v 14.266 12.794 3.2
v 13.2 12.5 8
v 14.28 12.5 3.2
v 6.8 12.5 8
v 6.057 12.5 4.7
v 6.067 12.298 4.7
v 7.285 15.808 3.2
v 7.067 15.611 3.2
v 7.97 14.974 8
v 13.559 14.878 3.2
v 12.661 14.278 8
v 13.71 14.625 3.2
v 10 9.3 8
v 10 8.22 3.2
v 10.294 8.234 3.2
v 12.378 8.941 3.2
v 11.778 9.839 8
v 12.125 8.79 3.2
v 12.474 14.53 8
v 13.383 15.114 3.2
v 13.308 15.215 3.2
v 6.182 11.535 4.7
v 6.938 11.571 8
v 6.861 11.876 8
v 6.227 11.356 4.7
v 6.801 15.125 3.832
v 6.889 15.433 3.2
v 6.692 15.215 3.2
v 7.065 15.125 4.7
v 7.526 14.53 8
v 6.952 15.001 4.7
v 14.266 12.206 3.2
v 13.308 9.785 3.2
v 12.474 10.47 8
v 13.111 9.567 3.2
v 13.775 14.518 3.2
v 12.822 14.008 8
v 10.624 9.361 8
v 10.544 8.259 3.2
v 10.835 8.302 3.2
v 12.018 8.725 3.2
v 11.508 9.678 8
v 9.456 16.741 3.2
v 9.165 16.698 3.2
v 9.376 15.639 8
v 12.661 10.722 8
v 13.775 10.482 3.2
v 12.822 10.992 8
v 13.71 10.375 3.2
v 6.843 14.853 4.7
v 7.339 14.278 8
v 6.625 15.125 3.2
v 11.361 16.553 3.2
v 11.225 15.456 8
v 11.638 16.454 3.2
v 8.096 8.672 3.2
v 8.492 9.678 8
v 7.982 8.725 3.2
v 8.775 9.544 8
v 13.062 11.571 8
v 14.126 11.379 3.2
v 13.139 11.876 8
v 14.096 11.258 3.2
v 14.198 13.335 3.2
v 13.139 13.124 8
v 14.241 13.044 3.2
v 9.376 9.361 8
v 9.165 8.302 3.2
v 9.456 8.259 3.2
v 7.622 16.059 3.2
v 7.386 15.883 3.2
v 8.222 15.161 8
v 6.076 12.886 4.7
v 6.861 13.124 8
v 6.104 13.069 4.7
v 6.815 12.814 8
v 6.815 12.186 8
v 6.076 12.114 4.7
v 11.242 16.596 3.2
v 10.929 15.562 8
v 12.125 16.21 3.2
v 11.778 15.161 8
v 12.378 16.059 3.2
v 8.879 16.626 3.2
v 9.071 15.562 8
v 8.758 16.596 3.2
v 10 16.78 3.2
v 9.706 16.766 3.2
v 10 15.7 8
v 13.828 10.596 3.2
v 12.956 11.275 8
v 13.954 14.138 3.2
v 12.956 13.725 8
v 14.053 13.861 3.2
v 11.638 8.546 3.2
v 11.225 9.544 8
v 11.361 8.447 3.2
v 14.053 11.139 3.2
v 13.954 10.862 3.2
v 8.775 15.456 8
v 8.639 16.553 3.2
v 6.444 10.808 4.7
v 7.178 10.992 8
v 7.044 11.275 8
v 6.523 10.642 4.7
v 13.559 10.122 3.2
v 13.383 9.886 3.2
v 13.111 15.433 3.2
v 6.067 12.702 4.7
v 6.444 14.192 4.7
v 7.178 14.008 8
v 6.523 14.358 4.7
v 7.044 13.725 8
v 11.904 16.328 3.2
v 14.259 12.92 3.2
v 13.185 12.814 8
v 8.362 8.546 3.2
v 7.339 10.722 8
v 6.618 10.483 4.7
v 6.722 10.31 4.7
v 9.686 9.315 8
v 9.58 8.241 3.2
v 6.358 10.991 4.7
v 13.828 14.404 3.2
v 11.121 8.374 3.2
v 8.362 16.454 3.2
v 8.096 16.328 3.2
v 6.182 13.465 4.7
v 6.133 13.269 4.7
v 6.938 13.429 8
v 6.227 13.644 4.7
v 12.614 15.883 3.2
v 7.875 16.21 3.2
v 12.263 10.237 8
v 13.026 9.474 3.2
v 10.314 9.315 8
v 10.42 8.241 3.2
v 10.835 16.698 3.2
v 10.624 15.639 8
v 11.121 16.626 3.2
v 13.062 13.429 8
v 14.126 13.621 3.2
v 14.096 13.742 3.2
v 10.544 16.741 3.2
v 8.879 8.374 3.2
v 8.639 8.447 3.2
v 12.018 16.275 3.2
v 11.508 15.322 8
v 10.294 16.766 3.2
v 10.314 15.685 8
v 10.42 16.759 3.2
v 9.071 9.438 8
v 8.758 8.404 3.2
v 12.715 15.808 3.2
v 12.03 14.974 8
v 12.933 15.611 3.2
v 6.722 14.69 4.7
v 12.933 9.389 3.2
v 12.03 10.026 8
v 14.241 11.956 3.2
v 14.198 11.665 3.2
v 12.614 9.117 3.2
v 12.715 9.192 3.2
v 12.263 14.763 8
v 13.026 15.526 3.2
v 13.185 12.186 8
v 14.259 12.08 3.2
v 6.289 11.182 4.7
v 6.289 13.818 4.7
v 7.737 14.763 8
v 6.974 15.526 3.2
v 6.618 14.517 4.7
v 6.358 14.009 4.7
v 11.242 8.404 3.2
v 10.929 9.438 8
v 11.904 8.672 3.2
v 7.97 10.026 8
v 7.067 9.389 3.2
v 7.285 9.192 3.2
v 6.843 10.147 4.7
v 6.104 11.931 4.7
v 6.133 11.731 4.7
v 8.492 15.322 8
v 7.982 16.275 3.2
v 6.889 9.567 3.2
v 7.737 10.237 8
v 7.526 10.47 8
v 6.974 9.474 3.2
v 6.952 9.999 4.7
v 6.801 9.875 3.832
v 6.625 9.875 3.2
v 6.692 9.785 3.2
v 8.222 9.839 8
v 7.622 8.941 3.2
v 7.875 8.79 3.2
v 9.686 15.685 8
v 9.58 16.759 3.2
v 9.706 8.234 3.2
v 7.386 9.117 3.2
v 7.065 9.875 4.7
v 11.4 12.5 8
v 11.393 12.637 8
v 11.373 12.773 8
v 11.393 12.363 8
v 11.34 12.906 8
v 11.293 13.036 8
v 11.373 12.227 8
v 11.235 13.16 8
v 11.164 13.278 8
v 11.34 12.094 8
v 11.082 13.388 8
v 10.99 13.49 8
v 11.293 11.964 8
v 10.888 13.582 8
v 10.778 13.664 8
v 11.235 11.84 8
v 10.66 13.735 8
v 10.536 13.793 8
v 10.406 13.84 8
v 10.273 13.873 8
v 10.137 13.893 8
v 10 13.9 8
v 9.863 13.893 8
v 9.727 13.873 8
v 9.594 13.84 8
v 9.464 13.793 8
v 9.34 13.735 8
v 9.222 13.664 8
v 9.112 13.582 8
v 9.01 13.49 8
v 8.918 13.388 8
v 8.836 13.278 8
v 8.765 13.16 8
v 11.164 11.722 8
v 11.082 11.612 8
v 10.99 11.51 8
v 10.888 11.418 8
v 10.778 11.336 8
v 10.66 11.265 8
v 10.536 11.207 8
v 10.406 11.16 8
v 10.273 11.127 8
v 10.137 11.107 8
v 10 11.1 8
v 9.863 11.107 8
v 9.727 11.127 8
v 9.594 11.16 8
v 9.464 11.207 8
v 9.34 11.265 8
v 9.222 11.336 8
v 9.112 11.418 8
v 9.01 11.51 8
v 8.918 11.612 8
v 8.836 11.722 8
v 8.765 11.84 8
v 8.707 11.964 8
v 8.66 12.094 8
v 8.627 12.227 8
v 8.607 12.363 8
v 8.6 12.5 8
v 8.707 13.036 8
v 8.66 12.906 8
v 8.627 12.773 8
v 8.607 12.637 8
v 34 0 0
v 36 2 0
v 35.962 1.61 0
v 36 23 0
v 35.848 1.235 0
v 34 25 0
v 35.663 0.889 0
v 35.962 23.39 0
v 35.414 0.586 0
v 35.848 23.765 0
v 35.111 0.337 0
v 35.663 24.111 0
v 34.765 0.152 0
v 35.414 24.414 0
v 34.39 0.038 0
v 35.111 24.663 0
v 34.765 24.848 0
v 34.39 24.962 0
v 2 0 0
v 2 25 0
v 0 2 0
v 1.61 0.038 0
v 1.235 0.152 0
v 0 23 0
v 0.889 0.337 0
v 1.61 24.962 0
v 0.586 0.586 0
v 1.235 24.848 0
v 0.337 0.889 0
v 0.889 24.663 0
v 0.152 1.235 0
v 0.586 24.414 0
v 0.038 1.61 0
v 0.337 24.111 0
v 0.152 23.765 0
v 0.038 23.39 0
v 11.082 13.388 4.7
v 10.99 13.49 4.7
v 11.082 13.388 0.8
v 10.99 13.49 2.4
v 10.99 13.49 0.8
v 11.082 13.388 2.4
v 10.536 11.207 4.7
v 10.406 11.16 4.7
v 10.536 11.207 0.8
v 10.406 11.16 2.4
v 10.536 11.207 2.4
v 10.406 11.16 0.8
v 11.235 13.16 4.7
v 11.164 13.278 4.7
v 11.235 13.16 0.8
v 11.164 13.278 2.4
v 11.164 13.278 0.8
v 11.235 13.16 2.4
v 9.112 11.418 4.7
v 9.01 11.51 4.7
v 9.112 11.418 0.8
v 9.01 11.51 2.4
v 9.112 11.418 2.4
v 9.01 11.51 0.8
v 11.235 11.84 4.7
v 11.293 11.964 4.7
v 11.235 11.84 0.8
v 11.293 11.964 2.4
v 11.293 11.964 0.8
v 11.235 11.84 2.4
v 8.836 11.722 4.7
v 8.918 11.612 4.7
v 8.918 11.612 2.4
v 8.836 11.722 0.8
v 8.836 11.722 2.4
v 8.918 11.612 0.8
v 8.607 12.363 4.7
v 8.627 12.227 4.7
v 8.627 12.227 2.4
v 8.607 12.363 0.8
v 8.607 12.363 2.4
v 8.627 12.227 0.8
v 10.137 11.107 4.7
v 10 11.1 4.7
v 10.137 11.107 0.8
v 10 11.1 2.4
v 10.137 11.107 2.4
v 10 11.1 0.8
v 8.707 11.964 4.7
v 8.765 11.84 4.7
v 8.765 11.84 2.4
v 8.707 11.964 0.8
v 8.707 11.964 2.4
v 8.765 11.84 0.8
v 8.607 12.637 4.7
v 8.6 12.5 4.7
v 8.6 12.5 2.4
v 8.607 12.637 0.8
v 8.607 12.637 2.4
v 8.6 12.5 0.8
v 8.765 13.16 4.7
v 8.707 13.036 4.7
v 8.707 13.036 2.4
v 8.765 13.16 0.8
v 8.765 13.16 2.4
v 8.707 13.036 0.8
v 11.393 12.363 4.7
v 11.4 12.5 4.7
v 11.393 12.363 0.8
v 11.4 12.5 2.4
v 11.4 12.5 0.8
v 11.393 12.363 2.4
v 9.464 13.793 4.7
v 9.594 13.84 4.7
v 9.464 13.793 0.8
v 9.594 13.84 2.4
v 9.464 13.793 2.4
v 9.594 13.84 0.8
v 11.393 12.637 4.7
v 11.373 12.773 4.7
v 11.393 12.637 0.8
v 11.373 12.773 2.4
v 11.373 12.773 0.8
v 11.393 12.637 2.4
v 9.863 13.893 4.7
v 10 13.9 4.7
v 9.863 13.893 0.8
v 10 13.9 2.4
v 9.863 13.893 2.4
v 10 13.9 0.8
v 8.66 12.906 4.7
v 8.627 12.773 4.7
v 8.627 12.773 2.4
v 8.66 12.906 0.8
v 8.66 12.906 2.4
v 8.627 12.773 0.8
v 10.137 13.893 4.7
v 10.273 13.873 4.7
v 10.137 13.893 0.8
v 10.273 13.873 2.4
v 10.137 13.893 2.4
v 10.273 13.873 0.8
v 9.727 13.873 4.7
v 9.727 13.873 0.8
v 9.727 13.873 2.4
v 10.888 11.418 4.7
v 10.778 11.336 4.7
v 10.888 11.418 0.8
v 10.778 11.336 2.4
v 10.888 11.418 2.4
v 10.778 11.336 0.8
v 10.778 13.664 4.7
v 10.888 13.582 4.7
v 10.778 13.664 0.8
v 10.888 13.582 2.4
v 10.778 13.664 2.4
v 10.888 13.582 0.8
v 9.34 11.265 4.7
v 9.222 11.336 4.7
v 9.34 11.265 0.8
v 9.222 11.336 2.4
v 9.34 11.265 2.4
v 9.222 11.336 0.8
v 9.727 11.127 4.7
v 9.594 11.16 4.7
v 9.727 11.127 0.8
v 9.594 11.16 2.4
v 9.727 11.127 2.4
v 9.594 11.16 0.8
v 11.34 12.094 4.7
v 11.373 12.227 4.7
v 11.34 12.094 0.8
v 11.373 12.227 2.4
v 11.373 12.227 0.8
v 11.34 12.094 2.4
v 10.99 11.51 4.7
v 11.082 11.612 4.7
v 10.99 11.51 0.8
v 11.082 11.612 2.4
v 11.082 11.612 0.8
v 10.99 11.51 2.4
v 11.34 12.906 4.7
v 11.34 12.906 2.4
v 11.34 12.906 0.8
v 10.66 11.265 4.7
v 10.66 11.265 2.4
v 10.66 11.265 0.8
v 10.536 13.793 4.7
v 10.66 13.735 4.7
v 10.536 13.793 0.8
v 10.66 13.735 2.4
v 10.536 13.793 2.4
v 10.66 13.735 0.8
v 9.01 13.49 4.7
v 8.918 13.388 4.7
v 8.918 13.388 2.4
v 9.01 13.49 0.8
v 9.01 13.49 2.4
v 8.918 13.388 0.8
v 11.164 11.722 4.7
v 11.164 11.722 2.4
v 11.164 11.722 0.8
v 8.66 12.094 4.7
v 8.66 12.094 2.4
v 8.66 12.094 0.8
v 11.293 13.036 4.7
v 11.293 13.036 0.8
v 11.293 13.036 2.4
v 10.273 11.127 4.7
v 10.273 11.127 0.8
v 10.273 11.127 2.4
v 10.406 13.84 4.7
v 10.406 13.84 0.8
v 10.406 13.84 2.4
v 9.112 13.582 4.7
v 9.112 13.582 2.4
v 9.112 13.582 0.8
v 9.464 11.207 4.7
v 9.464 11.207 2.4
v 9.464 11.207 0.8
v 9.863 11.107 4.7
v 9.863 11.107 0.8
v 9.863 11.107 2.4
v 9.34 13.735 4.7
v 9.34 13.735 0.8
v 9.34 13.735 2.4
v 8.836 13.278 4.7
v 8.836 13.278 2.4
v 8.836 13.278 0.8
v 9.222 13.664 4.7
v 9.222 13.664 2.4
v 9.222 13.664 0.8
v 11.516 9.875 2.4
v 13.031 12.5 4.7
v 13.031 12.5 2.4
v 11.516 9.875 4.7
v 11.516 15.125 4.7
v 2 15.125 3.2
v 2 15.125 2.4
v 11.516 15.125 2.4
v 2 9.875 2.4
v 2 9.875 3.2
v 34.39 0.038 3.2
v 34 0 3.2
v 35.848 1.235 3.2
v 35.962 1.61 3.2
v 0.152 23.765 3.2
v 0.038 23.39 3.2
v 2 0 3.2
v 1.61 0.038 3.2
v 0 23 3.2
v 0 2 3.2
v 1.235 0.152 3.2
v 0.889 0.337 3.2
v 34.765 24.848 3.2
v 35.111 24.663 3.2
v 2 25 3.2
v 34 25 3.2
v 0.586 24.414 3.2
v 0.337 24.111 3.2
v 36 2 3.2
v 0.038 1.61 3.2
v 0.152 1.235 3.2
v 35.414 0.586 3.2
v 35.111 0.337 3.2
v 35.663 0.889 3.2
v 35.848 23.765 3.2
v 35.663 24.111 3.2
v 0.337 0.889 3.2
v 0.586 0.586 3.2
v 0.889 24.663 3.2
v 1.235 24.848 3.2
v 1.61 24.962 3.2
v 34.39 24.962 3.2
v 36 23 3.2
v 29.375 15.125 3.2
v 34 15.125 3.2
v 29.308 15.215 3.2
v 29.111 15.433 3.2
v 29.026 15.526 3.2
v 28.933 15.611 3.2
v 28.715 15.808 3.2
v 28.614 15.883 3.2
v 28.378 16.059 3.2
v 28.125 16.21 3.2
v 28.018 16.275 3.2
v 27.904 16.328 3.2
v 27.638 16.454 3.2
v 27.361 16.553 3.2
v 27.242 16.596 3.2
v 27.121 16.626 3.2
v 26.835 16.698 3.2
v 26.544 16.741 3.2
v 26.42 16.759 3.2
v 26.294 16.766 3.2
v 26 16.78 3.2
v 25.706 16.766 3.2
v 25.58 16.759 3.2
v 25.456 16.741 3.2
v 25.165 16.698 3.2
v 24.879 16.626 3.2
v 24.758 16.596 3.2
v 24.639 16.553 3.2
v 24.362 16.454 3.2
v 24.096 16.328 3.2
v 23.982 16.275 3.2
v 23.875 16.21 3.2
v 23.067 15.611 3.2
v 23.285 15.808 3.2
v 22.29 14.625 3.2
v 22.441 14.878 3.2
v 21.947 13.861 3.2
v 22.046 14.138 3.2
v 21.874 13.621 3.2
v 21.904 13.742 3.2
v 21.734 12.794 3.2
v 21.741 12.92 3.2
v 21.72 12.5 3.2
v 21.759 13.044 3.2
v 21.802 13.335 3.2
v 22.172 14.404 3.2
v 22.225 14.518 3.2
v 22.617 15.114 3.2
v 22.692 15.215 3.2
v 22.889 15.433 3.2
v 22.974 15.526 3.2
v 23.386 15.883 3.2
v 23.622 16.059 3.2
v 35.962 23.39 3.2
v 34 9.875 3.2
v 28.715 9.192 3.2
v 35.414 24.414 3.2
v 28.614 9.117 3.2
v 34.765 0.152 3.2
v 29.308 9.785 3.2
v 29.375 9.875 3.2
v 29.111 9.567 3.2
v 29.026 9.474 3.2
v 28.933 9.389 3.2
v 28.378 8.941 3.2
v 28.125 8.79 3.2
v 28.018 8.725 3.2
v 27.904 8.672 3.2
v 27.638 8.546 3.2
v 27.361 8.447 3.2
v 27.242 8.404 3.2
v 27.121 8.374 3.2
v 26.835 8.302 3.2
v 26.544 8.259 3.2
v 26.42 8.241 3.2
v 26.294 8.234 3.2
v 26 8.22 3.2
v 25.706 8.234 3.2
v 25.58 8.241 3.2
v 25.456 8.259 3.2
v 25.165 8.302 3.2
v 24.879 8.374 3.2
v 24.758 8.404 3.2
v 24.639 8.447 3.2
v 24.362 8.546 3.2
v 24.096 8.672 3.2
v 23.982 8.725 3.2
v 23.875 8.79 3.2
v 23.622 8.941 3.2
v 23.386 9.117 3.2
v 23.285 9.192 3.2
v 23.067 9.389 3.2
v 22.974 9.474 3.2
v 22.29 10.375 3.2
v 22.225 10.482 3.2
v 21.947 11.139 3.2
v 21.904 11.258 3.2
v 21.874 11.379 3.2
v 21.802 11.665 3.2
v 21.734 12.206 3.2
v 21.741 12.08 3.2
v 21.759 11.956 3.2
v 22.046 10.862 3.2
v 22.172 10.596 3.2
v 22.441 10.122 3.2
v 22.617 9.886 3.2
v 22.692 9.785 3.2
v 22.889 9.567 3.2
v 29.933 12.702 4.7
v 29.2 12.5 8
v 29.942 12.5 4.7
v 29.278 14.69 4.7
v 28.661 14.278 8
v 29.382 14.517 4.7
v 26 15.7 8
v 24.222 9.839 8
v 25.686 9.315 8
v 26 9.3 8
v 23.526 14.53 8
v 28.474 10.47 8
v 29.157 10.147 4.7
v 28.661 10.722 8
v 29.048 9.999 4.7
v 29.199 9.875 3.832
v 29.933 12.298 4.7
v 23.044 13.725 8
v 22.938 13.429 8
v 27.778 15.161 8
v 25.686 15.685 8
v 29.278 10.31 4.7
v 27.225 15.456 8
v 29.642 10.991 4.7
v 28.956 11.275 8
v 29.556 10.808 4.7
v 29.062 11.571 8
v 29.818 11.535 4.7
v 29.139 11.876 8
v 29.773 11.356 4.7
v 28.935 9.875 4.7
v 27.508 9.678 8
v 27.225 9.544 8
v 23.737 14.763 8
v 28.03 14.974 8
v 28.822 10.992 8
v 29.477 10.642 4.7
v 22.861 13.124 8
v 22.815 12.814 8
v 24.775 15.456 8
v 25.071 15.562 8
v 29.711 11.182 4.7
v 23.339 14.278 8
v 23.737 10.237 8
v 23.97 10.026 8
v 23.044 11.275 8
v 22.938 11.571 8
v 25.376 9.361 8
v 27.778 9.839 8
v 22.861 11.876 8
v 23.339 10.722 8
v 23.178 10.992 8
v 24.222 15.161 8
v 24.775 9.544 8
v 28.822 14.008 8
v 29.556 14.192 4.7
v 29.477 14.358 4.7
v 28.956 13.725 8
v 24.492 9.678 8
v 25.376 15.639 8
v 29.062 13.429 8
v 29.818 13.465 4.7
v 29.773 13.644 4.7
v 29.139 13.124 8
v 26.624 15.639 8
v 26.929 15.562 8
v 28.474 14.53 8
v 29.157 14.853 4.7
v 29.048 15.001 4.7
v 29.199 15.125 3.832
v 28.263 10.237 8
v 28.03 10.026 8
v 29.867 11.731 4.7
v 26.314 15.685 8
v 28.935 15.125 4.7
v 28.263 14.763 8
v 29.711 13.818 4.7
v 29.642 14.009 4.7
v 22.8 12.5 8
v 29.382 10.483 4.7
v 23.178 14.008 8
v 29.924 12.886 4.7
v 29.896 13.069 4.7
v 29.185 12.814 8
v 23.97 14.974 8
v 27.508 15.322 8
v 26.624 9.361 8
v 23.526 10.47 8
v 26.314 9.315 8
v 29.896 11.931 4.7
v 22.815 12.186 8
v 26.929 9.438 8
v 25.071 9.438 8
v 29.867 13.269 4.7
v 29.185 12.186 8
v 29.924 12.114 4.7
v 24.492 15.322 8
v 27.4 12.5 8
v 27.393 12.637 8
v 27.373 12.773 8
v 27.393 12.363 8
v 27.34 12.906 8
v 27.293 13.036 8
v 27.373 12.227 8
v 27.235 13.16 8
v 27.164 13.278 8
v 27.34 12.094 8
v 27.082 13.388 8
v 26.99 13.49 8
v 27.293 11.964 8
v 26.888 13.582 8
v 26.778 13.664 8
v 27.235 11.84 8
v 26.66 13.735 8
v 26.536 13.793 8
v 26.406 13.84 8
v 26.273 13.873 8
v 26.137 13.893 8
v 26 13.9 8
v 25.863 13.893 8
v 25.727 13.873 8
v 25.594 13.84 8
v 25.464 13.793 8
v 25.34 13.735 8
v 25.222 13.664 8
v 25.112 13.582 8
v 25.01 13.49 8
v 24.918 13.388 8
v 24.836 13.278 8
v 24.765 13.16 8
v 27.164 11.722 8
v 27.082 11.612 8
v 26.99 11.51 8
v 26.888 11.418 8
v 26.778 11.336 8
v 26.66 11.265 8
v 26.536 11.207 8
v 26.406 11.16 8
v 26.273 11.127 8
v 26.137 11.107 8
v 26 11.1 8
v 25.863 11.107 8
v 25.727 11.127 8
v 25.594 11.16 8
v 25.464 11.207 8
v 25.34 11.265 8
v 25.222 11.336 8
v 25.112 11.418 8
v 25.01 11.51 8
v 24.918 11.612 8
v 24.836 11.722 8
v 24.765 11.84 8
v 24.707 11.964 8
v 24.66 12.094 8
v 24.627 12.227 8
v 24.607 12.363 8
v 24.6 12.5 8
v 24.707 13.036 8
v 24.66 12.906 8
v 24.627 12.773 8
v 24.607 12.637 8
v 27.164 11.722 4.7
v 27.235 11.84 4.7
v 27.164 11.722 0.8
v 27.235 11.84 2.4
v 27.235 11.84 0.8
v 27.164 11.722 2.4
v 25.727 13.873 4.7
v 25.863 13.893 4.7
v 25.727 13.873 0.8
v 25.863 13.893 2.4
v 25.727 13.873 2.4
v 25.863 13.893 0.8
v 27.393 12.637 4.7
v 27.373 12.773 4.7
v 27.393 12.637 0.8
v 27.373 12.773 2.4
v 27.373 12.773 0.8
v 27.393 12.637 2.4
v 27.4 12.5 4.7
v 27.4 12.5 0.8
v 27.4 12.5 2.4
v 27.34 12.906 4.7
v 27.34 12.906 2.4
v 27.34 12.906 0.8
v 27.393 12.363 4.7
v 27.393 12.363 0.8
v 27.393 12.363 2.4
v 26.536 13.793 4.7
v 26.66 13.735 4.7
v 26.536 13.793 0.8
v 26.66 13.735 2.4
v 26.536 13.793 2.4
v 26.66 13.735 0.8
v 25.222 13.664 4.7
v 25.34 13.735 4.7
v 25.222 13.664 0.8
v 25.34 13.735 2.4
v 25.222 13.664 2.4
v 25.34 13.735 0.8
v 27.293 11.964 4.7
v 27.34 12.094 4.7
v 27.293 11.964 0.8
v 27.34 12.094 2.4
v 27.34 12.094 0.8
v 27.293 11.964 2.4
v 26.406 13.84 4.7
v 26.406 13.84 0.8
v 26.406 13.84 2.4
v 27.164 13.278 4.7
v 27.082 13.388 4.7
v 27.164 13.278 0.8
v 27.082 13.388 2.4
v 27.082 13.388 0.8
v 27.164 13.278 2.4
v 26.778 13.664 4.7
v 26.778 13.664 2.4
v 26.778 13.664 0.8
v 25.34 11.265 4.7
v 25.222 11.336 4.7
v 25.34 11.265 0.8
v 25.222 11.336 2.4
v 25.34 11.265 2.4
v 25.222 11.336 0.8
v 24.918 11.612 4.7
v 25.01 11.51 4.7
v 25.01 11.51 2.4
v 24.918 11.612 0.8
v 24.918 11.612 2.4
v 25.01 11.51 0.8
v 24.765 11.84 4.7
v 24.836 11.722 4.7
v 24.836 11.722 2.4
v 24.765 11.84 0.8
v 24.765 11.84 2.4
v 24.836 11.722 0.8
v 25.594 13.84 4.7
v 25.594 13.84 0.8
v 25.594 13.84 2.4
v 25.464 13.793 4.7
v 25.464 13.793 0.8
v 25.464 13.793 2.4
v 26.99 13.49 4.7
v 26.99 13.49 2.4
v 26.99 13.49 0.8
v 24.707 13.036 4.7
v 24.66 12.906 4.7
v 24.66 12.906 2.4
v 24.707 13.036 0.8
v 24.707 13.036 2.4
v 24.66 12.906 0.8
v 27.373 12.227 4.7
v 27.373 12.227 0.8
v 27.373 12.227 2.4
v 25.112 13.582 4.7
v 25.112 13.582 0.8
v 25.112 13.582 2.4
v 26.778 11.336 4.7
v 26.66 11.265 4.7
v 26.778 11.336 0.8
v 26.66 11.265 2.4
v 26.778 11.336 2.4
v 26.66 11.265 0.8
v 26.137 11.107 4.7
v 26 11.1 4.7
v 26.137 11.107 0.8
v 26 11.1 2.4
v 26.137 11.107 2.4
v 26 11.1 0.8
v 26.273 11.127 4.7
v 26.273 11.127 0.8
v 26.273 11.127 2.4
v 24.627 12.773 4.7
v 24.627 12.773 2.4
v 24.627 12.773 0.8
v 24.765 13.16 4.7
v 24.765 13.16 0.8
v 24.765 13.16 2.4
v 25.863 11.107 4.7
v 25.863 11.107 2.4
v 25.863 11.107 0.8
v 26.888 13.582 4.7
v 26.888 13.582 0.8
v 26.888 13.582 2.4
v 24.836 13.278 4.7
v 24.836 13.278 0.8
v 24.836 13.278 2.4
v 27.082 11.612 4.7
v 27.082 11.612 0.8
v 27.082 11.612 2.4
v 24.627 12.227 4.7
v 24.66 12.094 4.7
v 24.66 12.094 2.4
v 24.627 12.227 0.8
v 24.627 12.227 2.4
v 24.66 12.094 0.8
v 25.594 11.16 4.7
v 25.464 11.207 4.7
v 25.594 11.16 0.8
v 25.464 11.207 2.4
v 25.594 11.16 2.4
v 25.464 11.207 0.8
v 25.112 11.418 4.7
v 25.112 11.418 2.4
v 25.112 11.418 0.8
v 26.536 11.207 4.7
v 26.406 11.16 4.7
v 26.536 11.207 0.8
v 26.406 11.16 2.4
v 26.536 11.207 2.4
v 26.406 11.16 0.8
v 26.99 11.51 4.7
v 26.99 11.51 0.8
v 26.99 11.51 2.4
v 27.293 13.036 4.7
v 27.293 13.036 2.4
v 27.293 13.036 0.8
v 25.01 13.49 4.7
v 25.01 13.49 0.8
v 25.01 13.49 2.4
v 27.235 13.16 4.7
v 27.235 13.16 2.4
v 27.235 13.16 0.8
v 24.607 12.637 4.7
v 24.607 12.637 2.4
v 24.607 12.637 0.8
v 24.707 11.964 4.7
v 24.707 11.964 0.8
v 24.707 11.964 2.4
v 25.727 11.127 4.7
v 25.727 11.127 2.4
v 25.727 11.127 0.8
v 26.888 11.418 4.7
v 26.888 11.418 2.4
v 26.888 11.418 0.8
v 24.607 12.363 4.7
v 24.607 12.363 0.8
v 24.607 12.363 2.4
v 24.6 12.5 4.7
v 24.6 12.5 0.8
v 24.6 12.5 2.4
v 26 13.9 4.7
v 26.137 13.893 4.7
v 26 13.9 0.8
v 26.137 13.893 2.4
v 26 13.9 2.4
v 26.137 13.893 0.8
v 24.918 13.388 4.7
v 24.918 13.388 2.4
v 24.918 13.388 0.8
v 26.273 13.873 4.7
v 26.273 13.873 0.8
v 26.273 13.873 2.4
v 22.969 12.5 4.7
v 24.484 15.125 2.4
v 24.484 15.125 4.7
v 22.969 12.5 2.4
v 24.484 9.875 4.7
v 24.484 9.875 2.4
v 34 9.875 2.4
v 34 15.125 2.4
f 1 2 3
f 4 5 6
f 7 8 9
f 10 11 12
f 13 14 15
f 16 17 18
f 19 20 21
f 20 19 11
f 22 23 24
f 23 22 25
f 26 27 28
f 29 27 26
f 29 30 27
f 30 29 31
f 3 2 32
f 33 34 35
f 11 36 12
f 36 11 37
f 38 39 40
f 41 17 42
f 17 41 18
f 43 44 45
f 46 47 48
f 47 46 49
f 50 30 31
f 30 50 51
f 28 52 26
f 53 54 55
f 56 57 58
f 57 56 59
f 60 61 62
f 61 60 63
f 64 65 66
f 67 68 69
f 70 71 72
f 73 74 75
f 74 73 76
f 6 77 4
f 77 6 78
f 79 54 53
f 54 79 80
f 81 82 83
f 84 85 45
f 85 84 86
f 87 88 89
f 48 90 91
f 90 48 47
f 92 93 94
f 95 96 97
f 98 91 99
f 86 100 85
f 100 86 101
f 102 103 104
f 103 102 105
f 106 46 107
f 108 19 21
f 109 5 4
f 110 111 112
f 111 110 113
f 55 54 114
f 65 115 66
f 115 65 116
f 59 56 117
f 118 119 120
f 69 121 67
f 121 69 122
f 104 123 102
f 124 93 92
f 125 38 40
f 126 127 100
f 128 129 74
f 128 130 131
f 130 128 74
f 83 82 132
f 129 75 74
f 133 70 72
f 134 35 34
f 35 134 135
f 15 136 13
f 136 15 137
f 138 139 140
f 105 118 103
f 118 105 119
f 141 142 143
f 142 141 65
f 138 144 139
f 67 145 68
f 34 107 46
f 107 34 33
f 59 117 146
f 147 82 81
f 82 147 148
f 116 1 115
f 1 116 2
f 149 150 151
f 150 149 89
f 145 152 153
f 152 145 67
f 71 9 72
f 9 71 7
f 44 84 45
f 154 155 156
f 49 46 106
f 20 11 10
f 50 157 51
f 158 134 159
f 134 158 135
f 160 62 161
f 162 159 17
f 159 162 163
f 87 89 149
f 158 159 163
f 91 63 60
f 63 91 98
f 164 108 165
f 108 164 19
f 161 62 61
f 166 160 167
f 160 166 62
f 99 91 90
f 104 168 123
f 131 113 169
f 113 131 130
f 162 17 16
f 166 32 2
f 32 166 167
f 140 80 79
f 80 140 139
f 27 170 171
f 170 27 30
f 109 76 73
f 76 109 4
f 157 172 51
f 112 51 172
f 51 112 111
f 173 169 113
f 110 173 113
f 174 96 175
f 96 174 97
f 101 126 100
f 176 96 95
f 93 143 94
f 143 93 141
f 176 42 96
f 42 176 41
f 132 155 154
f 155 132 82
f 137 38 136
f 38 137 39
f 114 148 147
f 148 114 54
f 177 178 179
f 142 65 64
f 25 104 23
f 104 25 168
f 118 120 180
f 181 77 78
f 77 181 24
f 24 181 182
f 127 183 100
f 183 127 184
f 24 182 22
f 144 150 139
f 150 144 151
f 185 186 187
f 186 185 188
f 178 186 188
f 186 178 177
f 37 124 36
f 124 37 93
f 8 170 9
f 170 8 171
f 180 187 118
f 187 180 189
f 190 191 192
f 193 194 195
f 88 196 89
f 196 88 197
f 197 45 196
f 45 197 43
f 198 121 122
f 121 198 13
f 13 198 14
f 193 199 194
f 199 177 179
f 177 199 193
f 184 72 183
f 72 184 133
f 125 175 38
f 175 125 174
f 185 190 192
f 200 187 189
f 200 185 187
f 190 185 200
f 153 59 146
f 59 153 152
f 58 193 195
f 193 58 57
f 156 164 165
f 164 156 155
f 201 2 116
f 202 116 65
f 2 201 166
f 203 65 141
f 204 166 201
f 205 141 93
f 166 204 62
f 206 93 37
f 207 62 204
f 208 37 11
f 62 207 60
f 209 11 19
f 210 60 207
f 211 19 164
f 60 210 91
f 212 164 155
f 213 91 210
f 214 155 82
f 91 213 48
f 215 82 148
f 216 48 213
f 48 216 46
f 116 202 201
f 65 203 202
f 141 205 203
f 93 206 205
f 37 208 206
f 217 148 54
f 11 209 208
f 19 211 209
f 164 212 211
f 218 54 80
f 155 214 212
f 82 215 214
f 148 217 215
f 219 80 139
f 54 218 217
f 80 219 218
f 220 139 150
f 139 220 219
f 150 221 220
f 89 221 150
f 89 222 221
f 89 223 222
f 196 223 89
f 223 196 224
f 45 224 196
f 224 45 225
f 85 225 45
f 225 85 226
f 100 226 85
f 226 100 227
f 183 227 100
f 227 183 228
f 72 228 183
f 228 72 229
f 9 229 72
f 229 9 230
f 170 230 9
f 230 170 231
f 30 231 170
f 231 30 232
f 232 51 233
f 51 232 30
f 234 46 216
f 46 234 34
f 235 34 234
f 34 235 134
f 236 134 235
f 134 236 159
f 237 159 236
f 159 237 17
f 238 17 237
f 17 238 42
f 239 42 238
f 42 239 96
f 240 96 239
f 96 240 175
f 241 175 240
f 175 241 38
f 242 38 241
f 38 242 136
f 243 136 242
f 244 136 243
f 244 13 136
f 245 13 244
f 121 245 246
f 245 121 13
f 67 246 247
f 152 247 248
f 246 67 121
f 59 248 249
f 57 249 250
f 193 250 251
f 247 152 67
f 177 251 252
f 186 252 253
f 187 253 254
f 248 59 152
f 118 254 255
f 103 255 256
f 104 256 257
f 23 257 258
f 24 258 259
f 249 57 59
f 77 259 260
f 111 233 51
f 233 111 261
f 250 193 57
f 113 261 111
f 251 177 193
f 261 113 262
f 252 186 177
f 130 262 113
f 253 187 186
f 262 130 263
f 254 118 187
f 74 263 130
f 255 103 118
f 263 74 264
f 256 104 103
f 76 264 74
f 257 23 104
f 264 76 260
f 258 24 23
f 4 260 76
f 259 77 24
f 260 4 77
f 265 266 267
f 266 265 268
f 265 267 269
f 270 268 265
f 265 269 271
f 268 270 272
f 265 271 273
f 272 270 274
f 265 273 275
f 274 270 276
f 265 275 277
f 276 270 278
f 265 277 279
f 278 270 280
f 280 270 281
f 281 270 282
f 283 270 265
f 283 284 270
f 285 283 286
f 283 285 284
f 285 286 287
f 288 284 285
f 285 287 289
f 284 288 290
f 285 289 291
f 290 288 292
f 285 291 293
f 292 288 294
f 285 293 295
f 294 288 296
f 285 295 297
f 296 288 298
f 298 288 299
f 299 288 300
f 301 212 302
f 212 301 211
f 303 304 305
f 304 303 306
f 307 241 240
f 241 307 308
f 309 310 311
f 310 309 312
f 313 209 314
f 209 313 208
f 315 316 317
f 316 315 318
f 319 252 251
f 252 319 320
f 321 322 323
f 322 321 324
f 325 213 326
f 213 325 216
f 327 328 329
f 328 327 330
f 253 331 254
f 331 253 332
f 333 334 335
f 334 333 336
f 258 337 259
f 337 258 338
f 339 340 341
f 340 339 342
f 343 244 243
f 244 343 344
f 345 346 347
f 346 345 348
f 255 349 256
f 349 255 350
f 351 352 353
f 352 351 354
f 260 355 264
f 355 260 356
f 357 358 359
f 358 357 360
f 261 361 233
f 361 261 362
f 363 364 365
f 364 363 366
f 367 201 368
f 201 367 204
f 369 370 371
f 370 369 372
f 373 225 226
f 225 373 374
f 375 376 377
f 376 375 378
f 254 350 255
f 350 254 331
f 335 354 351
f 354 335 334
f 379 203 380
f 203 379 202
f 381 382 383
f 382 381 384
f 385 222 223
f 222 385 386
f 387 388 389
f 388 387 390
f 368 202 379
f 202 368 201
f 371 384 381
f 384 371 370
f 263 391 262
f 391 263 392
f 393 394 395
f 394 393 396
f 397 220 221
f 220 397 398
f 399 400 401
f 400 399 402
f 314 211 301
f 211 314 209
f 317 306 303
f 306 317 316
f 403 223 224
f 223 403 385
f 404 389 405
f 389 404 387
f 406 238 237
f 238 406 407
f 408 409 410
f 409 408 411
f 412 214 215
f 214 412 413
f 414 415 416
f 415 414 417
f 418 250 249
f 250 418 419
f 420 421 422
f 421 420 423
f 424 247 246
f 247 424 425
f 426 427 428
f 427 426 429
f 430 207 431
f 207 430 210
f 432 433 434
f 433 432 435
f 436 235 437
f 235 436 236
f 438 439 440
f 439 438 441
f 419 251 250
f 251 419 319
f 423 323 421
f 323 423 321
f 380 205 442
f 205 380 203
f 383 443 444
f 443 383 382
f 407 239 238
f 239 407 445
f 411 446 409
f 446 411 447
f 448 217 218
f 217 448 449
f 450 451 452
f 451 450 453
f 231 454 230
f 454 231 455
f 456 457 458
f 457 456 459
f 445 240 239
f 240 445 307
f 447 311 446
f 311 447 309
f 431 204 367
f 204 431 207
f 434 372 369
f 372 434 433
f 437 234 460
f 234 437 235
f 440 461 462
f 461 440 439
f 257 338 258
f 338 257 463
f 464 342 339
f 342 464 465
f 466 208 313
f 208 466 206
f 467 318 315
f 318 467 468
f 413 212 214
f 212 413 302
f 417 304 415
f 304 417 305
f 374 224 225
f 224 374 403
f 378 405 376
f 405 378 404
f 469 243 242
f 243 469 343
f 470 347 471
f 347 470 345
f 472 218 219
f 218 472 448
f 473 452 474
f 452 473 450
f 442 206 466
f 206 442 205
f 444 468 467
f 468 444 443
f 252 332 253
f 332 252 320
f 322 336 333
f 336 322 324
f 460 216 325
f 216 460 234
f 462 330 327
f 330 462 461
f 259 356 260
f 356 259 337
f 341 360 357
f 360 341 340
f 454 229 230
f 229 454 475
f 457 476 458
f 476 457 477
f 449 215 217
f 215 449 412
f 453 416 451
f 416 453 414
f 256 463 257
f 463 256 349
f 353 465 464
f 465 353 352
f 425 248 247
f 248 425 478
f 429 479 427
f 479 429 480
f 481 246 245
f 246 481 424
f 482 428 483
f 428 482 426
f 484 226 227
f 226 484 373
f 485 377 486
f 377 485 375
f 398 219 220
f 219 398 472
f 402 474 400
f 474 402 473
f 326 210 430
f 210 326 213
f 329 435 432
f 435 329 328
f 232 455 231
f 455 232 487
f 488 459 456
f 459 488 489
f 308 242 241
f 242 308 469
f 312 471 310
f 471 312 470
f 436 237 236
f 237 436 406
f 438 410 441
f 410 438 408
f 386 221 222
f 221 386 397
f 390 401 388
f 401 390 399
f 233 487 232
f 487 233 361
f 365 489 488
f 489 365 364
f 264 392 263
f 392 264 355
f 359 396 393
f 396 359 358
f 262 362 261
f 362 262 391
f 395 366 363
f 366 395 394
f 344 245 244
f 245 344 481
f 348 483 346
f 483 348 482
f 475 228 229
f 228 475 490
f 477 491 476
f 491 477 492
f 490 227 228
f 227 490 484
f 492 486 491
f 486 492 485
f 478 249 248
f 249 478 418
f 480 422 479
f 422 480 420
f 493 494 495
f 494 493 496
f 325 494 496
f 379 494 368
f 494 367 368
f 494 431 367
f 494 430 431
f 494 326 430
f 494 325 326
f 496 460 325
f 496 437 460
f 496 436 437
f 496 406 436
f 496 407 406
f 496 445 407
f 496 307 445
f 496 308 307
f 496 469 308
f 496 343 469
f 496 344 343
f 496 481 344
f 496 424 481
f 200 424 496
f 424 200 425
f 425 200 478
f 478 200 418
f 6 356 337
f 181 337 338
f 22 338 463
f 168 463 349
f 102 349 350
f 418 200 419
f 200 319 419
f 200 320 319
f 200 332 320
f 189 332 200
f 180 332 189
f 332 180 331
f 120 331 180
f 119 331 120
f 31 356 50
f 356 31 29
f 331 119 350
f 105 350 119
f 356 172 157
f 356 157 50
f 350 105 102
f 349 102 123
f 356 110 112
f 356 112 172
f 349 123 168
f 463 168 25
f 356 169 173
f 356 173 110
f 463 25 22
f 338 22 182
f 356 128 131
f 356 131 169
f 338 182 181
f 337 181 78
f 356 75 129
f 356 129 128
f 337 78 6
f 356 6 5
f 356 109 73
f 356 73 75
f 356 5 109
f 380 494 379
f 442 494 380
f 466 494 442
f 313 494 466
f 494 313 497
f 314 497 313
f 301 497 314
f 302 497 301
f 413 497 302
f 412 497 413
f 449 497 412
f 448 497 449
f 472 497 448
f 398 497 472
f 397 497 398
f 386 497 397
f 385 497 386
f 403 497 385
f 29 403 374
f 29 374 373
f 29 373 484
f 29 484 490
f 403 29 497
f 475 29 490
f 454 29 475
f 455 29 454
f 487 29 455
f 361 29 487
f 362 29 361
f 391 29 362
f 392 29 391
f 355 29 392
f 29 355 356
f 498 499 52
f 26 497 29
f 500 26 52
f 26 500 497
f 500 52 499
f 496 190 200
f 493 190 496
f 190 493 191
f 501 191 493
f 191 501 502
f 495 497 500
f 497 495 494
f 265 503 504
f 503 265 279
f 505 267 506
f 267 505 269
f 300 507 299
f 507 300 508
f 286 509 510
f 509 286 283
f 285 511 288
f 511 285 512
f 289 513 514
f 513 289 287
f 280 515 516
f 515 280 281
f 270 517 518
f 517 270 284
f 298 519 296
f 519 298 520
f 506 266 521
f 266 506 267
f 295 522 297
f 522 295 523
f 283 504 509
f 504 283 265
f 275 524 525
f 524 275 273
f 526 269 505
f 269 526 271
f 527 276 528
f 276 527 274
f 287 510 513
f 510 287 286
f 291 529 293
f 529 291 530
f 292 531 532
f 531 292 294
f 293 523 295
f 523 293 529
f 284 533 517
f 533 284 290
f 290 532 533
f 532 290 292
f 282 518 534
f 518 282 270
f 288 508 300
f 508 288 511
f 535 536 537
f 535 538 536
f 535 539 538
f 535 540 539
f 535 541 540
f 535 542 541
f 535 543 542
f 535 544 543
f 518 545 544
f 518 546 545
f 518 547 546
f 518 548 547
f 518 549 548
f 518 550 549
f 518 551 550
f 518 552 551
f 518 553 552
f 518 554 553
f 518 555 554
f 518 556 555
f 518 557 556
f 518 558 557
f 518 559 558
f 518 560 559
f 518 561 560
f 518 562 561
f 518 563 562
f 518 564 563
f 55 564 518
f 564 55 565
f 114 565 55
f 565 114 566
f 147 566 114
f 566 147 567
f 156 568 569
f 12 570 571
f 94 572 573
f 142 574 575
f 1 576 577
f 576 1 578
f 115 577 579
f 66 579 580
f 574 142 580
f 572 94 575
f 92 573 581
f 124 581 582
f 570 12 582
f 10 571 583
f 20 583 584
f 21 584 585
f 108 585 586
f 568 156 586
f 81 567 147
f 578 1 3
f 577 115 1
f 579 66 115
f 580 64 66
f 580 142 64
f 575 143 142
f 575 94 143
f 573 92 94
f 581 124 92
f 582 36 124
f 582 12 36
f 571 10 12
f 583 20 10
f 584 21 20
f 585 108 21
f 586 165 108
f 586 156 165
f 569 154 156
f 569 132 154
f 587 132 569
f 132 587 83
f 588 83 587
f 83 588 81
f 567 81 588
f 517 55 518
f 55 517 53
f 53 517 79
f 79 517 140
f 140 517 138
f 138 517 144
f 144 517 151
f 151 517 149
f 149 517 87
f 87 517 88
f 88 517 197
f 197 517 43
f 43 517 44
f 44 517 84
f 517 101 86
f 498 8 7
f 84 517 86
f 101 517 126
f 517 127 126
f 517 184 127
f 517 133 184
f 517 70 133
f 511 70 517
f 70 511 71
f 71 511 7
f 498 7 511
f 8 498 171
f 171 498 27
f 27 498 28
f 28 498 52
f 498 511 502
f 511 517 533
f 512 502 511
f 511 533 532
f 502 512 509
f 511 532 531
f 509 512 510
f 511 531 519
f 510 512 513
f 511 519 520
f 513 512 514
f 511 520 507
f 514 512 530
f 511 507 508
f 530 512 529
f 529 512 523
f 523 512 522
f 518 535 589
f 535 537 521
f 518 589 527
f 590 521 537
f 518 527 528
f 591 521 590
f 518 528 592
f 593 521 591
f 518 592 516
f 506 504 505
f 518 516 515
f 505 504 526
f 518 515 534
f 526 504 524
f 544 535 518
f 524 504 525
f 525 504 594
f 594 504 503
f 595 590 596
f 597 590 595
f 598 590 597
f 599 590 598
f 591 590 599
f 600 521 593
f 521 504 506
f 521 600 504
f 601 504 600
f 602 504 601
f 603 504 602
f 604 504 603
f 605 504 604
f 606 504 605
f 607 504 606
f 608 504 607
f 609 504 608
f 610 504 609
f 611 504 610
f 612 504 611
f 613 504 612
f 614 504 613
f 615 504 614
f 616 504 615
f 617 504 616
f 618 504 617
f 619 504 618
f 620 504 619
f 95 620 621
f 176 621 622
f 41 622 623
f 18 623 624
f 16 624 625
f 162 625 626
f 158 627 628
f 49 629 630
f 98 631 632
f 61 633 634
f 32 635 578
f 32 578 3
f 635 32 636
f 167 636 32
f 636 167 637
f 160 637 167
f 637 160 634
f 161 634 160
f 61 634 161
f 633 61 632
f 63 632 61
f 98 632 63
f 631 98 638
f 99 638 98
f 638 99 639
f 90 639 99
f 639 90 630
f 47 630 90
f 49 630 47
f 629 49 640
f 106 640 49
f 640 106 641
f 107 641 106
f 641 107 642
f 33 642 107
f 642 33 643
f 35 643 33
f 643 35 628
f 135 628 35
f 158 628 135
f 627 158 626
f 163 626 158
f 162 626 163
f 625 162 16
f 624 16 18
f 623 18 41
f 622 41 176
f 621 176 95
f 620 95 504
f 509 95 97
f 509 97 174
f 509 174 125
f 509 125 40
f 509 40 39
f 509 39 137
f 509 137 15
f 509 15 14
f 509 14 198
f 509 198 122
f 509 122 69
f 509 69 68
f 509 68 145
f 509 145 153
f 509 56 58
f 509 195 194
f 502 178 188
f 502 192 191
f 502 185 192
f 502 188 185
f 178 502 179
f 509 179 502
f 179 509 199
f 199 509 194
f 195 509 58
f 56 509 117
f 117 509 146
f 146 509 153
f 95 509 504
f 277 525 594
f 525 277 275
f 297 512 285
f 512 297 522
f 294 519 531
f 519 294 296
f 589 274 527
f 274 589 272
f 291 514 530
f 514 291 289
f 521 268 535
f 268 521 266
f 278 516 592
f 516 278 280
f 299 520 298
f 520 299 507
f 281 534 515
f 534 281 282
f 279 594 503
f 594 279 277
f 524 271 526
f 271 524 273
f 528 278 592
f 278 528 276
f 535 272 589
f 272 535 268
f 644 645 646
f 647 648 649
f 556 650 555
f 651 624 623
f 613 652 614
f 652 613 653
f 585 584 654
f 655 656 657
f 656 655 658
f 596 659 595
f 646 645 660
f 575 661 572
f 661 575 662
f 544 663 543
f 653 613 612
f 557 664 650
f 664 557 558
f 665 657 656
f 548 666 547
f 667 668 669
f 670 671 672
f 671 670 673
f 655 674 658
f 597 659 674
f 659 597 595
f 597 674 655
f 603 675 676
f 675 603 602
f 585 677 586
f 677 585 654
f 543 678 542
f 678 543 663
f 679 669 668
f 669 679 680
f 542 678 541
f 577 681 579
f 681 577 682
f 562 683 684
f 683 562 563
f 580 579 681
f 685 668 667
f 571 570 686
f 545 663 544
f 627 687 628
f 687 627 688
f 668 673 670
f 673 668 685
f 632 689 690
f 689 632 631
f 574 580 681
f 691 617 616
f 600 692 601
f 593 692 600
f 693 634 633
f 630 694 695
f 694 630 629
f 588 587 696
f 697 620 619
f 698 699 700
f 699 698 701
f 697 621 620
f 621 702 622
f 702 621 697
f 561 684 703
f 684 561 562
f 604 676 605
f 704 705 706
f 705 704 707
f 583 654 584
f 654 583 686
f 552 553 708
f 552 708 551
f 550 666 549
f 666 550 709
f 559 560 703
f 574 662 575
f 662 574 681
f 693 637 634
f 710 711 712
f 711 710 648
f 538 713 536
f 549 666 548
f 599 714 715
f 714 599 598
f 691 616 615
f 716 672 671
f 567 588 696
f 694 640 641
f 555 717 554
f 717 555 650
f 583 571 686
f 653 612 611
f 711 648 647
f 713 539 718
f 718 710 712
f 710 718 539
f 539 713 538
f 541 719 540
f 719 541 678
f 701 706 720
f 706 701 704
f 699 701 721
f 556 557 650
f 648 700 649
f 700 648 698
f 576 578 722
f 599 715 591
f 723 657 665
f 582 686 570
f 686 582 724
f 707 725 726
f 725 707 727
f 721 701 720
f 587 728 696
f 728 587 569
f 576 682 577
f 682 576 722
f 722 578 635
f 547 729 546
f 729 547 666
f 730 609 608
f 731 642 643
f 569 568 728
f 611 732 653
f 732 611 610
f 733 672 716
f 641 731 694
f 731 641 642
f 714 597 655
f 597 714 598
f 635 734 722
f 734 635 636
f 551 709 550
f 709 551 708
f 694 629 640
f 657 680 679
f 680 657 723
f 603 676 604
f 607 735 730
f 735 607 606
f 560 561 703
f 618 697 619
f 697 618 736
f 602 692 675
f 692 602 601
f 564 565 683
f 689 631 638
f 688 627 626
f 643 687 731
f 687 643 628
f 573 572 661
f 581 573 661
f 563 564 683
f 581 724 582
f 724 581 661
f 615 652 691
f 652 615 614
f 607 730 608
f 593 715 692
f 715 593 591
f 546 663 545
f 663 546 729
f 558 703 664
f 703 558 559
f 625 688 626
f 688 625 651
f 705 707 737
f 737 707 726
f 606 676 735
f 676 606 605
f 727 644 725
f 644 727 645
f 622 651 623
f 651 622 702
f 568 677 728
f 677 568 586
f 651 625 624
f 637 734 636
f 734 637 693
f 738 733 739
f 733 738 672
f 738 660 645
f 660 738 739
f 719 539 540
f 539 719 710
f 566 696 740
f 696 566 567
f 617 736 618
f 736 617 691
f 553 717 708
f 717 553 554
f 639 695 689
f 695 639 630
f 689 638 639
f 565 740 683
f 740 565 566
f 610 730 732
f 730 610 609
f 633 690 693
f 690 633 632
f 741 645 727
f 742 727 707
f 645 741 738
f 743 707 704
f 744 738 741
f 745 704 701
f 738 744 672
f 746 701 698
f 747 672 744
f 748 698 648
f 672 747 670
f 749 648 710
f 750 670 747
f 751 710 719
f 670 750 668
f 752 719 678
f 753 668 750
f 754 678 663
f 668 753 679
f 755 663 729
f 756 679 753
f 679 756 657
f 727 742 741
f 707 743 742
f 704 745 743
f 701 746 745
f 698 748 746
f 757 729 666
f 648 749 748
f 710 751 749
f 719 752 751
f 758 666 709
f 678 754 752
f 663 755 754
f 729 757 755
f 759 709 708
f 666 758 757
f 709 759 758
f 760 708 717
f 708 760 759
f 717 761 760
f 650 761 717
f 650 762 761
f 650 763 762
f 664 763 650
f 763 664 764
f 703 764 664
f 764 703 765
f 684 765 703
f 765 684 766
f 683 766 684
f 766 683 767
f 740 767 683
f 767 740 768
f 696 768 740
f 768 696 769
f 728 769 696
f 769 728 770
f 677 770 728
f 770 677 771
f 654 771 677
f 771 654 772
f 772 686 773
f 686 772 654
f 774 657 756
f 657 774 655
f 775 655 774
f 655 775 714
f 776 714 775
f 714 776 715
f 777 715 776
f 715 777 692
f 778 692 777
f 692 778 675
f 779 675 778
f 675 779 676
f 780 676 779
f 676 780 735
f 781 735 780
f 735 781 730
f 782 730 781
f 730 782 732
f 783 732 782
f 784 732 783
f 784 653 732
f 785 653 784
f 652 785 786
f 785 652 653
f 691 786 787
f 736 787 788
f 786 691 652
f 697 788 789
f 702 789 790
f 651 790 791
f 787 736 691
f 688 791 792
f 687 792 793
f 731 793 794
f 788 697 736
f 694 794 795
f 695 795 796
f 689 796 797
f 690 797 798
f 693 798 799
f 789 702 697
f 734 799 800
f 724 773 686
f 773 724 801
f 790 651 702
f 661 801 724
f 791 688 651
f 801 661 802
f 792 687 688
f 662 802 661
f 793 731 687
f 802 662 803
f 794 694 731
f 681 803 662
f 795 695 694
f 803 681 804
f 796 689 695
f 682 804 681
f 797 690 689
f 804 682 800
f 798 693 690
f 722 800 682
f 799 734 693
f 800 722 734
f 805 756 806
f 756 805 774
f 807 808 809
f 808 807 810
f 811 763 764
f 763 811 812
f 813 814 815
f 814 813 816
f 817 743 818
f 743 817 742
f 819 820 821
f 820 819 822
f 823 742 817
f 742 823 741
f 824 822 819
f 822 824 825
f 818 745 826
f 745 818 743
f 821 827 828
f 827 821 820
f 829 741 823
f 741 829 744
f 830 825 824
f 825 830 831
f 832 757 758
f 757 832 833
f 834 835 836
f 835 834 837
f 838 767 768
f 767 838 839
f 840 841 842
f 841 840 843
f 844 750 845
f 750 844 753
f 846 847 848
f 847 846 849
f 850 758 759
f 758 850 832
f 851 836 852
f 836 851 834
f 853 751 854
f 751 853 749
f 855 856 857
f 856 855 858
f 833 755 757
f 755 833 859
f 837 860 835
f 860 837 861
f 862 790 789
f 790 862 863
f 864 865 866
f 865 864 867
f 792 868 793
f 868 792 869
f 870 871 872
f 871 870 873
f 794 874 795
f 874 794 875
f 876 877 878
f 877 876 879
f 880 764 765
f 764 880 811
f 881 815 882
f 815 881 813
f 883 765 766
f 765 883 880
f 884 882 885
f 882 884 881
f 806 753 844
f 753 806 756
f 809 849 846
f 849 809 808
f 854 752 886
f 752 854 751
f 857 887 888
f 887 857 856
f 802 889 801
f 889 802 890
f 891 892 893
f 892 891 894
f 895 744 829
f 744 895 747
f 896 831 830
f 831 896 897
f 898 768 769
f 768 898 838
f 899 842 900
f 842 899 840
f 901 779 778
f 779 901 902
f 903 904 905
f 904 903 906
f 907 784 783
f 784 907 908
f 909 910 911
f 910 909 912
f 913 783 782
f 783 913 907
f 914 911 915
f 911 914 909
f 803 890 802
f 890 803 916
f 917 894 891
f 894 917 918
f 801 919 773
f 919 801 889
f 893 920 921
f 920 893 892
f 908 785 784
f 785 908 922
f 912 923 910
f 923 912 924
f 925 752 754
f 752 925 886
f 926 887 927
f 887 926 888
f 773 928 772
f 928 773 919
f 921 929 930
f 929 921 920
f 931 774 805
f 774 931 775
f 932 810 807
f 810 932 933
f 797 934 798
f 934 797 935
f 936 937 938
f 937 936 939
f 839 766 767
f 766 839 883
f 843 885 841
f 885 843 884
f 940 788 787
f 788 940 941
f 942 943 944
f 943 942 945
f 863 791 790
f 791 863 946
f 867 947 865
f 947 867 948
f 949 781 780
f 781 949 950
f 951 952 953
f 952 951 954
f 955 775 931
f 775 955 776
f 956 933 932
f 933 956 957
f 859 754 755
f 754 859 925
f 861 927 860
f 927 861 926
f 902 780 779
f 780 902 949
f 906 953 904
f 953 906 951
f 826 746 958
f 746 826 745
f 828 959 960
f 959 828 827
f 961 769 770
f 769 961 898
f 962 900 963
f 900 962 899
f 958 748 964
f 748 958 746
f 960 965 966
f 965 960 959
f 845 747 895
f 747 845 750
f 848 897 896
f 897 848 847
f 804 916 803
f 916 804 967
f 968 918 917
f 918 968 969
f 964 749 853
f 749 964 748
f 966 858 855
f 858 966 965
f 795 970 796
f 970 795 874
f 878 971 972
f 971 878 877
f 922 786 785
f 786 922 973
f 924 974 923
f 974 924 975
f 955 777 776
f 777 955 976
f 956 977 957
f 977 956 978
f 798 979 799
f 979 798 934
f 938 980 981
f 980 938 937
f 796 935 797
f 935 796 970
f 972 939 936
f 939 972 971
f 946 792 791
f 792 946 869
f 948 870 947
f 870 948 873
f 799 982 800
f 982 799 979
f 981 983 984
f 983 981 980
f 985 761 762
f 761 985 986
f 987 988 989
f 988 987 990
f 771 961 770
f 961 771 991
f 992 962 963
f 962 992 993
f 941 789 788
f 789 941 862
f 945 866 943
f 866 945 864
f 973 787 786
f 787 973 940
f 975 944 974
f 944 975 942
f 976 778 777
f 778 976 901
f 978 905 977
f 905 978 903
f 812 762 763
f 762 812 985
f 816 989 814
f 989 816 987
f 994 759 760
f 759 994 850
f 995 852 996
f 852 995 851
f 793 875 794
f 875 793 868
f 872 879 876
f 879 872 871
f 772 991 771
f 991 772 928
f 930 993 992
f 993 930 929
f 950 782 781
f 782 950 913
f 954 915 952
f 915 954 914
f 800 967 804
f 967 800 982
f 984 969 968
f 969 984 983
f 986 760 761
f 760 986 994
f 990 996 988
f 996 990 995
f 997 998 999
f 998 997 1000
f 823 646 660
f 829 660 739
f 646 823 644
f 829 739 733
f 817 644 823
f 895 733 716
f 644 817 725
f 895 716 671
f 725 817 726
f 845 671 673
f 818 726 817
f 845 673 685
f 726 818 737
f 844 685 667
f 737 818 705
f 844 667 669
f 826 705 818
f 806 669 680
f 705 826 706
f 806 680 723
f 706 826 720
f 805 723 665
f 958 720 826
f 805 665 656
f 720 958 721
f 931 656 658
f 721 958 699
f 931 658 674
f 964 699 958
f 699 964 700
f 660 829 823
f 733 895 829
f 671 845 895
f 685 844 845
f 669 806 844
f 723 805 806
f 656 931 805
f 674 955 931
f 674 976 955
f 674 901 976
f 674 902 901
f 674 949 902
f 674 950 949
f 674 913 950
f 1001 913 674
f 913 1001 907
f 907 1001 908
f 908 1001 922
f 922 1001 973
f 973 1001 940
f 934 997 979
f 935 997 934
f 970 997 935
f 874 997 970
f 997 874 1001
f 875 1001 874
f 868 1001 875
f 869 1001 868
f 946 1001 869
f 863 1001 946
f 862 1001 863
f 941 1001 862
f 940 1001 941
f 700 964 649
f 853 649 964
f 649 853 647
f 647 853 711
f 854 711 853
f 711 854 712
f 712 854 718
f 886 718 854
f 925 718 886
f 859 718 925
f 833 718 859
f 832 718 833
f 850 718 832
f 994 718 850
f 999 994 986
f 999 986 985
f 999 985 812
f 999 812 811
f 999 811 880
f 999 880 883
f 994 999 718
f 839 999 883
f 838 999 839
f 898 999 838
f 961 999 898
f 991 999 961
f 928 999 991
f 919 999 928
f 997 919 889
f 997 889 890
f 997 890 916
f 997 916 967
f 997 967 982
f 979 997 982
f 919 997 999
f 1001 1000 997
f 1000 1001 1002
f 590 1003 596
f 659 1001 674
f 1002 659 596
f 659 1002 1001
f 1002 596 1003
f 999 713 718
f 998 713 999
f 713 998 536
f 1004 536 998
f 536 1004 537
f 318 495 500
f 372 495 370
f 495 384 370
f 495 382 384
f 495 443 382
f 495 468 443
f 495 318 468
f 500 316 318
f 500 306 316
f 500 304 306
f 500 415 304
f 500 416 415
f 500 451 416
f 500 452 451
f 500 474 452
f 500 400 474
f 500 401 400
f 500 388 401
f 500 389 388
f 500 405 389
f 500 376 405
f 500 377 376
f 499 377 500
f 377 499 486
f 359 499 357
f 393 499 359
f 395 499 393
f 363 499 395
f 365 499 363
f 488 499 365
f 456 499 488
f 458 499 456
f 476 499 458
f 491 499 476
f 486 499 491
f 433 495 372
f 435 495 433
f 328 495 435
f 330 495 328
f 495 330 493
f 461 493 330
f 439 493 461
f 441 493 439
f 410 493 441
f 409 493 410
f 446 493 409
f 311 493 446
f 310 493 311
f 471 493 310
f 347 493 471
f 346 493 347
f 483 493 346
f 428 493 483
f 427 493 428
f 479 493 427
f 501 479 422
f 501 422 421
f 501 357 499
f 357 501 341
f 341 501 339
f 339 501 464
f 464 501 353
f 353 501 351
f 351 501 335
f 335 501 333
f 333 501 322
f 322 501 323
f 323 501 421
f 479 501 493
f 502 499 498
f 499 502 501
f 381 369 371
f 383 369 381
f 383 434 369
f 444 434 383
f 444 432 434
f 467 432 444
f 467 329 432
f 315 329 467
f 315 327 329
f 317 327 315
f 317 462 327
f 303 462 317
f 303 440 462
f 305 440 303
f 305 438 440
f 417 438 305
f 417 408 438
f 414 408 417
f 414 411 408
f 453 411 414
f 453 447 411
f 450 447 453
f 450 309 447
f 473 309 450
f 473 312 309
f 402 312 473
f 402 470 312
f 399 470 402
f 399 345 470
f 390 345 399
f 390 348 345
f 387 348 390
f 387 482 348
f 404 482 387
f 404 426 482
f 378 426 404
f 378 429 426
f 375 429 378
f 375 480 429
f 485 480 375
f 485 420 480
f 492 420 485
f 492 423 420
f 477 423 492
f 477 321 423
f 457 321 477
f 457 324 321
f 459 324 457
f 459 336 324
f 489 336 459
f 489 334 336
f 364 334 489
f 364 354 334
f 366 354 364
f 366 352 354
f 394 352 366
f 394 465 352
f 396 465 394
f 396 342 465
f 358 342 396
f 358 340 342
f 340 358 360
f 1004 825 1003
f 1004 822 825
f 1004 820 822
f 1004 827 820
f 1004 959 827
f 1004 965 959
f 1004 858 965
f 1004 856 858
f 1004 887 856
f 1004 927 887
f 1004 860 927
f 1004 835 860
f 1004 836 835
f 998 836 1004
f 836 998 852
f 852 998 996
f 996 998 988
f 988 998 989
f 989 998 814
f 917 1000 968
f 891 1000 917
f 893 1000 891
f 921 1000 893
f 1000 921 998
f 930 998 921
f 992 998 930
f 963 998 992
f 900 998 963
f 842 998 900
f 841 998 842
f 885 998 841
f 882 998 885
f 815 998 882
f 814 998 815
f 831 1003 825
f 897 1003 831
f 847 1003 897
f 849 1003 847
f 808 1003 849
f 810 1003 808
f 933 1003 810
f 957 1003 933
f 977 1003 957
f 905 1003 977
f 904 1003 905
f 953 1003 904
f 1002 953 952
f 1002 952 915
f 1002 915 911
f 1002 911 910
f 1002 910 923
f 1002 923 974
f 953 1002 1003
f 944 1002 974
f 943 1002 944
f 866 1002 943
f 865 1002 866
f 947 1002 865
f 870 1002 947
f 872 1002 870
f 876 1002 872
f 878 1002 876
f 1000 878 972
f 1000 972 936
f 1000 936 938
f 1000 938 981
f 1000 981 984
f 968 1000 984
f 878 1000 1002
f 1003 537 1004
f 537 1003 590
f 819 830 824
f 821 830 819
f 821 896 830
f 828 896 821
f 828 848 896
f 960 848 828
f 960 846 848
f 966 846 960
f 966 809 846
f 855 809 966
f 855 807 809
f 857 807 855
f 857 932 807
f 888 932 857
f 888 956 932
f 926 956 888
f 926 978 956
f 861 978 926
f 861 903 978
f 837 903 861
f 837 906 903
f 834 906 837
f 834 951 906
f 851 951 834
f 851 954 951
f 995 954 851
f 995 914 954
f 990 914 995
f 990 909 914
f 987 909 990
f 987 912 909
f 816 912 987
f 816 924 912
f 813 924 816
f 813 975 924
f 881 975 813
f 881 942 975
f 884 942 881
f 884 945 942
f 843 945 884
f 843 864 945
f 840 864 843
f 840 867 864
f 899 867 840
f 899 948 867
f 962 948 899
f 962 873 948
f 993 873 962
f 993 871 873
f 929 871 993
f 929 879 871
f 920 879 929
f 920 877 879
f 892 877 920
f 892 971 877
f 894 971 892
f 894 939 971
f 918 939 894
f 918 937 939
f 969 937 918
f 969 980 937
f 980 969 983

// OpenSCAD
// Revision 2 / mm / generated from ../../rev2-parameters.json
difference(){
difference(){
difference(){
difference(){
union(){
union(){
translate([0, 0, 0]){
linear_extrude(height=3.2) polygon(points=[[34.0, 0.0], [2.0, 0.0], [1.609819, 0.038429], [1.234633, 0.152241], [0.88886, 0.337061], [0.585786, 0.585786], [0.337061, 0.88886], [0.152241, 1.234633], [0.038429, 1.609819], [0.0, 2.0], [0.0, 23.0], [0.038429, 23.390181], [0.152241, 23.765367], [0.337061, 24.11114], [0.585786, 24.414214], [0.88886, 24.662939], [1.234633, 24.847759], [1.609819, 24.961571], [2.0, 25.0], [34.0, 25.0], [34.390181, 24.961571], [34.765367, 24.847759], [35.11114, 24.662939], [35.414214, 24.414214], [35.662939, 24.11114], [35.847759, 23.765367], [35.961571, 23.390181], [36.0, 23.0], [36.0, 2.0], [35.961571, 1.609819], [35.847759, 1.234633], [35.662939, 0.88886], [35.414214, 0.585786], [35.11114, 0.337061], [34.765367, 0.152241], [34.390181, 0.038429]],paths=[[0, 1, 2, 3, 4, 5, 6, 7, 8, 9, 10, 11, 12, 13, 14, 15, 16, 17, 18, 19, 20, 21, 22, 23, 24, 25, 26, 27, 28, 29, 30, 31, 32, 33, 34, 35]]);
}
difference(){
difference(){
translate([10, 12.5, 0]){
cylinder(h=8,d1=10.0,d2=6.4,$fn=64);
}
translate([10, 12.5, 0.8]){
cylinder(h=7.22,d1=2.8,d2=2.8,$fn=64);
}
}
translate([0, 0, 2.4]){
linear_extrude(height=2.3) polygon(points=[[11.515544, 15.125], [13.031089, 12.5], [11.515544, 9.875], [10.0, 9.875], [8.484456, 9.875], [2.0, 9.875], [2.0, 15.125], [8.484456, 15.125], [10.0, 15.125]],paths=[[0, 1, 2, 3, 4, 5, 6, 7, 8]]);
}
}
}
difference(){
difference(){
translate([26, 12.5, 0]){
cylinder(h=8,d1=10.0,d2=6.4,$fn=64);
}
translate([26, 12.5, 0.8]){
cylinder(h=7.22,d1=2.8,d2=2.8,$fn=64);
}
}
translate([0, 0, 2.4]){
linear_extrude(height=2.3) polygon(points=[[27.515544, 15.125], [34.0, 15.125], [34.0, 9.875], [27.515544, 9.875], [26.0, 9.875], [24.484456, 9.875], [22.968911, 12.5], [24.484456, 15.125], [26.0, 15.125]],paths=[[0, 1, 2, 3, 4, 5, 6, 7, 8]]);
}
}
}
translate([0, 0, 2.4]){
linear_extrude(height=2.3) polygon(points=[[11.515544, 15.125], [13.031089, 12.5], [11.515544, 9.875], [10.0, 9.875], [8.484456, 9.875], [2.0, 9.875], [2.0, 15.125], [8.484456, 15.125], [10.0, 15.125]],paths=[[0, 1, 2, 3, 4, 5, 6, 7, 8]]);
}
}
translate([10, 12.5, 0.8]){
cylinder(h=7.22,d1=2.8,d2=2.8,$fn=64);
}
}
translate([0, 0, 2.4]){
linear_extrude(height=2.3) polygon(points=[[27.515544, 15.125], [34.0, 15.125], [34.0, 9.875], [27.515544, 9.875], [26.0, 9.875], [24.484456, 9.875], [22.968911, 12.5], [24.484456, 15.125], [26.0, 15.125]],paths=[[0, 1, 2, 3, 4, 5, 6, 7, 8]]);
}
}
translate([26, 12.5, 0.8]){
cylinder(h=7.22,d1=2.8,d2=2.8,$fn=64);
}
}
